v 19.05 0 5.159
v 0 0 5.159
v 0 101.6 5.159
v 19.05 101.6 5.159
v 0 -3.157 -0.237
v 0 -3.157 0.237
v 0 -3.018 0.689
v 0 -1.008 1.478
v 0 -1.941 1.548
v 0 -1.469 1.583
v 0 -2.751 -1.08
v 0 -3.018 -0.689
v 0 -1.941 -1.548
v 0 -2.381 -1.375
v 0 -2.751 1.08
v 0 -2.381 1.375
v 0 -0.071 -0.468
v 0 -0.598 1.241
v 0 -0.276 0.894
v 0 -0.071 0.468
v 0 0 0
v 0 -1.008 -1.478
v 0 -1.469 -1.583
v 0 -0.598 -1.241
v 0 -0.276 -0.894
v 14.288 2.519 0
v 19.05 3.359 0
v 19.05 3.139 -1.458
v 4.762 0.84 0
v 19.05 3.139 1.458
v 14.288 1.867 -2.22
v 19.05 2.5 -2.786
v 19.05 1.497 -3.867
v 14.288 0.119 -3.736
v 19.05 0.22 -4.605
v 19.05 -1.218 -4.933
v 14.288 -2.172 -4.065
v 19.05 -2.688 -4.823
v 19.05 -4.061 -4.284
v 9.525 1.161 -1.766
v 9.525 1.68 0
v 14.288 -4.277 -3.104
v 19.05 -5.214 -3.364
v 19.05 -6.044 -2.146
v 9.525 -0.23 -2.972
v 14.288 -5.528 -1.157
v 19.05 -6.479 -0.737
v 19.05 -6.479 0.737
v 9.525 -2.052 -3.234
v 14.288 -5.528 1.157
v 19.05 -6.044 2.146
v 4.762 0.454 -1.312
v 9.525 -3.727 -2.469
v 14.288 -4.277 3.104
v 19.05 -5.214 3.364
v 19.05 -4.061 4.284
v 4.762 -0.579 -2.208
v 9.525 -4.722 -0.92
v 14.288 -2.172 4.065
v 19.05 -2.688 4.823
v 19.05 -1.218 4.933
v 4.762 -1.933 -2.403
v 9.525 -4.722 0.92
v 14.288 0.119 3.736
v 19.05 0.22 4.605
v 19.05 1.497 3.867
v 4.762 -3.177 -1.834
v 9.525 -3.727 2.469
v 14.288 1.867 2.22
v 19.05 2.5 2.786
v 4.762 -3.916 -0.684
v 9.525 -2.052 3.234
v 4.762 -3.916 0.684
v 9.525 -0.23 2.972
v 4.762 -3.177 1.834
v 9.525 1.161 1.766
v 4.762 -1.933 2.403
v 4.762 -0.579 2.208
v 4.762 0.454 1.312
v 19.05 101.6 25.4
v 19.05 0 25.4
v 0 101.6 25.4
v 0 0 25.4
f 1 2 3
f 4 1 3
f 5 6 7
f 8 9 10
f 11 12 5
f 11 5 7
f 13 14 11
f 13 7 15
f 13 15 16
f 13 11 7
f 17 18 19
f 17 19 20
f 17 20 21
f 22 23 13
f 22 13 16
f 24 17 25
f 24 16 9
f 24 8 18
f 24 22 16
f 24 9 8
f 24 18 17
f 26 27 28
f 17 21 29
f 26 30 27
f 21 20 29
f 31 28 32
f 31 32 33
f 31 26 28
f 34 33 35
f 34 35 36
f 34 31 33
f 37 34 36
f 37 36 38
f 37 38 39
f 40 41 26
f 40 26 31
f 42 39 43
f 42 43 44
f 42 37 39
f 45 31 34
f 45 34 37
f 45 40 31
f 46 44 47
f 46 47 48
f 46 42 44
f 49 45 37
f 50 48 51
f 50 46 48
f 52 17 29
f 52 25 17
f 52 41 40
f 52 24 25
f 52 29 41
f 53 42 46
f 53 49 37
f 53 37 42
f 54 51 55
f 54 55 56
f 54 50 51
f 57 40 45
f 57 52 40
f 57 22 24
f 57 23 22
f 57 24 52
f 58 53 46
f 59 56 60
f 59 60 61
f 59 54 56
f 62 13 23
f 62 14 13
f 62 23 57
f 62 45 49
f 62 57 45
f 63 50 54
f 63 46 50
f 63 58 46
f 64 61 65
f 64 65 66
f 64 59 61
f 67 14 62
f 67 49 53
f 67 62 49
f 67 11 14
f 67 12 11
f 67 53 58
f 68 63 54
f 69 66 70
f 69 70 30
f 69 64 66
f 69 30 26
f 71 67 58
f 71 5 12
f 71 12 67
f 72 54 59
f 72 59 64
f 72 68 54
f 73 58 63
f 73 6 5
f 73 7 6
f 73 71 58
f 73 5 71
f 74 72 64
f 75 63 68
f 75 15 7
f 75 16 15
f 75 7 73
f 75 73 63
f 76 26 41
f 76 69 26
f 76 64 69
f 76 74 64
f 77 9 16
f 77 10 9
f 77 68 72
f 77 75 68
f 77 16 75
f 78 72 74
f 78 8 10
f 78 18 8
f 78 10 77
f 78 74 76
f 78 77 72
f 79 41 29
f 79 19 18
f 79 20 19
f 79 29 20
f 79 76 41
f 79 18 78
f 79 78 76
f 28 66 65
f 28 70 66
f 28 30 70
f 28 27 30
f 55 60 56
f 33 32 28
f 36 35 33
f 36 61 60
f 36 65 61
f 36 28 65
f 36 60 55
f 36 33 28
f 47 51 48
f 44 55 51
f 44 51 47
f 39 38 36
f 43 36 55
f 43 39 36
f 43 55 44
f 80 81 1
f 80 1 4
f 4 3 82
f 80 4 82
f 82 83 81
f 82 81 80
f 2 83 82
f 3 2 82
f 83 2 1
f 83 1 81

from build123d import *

# Parameters (mm, degrees)
F3_W     = 101.6
F3_H     = 20.240625
F4_DEPTH = 19.05


with BuildPart() as f4:
    # F3 (on Right) → F4 (new body)
    with BuildSketch(Plane.YZ):
        with Locations((50.8, 15.279687)):
            Rectangle(F3_W, F3_H)
    extrude(amount=F4_DEPTH)


with BuildPart() as f6:
    # F5 (on Top) → F6 (revolve)
    with BuildSketch(Plane.XY):
        Polygon((19.05, 3.359029), (0, 0), (0, -1.5875), (19.05, -1.5875), align=None)
    revolve(axis=Axis((9.525, -1.5875, 0), (-1, 0, 0)))


solid = Compound([f4.part, f6.part])
